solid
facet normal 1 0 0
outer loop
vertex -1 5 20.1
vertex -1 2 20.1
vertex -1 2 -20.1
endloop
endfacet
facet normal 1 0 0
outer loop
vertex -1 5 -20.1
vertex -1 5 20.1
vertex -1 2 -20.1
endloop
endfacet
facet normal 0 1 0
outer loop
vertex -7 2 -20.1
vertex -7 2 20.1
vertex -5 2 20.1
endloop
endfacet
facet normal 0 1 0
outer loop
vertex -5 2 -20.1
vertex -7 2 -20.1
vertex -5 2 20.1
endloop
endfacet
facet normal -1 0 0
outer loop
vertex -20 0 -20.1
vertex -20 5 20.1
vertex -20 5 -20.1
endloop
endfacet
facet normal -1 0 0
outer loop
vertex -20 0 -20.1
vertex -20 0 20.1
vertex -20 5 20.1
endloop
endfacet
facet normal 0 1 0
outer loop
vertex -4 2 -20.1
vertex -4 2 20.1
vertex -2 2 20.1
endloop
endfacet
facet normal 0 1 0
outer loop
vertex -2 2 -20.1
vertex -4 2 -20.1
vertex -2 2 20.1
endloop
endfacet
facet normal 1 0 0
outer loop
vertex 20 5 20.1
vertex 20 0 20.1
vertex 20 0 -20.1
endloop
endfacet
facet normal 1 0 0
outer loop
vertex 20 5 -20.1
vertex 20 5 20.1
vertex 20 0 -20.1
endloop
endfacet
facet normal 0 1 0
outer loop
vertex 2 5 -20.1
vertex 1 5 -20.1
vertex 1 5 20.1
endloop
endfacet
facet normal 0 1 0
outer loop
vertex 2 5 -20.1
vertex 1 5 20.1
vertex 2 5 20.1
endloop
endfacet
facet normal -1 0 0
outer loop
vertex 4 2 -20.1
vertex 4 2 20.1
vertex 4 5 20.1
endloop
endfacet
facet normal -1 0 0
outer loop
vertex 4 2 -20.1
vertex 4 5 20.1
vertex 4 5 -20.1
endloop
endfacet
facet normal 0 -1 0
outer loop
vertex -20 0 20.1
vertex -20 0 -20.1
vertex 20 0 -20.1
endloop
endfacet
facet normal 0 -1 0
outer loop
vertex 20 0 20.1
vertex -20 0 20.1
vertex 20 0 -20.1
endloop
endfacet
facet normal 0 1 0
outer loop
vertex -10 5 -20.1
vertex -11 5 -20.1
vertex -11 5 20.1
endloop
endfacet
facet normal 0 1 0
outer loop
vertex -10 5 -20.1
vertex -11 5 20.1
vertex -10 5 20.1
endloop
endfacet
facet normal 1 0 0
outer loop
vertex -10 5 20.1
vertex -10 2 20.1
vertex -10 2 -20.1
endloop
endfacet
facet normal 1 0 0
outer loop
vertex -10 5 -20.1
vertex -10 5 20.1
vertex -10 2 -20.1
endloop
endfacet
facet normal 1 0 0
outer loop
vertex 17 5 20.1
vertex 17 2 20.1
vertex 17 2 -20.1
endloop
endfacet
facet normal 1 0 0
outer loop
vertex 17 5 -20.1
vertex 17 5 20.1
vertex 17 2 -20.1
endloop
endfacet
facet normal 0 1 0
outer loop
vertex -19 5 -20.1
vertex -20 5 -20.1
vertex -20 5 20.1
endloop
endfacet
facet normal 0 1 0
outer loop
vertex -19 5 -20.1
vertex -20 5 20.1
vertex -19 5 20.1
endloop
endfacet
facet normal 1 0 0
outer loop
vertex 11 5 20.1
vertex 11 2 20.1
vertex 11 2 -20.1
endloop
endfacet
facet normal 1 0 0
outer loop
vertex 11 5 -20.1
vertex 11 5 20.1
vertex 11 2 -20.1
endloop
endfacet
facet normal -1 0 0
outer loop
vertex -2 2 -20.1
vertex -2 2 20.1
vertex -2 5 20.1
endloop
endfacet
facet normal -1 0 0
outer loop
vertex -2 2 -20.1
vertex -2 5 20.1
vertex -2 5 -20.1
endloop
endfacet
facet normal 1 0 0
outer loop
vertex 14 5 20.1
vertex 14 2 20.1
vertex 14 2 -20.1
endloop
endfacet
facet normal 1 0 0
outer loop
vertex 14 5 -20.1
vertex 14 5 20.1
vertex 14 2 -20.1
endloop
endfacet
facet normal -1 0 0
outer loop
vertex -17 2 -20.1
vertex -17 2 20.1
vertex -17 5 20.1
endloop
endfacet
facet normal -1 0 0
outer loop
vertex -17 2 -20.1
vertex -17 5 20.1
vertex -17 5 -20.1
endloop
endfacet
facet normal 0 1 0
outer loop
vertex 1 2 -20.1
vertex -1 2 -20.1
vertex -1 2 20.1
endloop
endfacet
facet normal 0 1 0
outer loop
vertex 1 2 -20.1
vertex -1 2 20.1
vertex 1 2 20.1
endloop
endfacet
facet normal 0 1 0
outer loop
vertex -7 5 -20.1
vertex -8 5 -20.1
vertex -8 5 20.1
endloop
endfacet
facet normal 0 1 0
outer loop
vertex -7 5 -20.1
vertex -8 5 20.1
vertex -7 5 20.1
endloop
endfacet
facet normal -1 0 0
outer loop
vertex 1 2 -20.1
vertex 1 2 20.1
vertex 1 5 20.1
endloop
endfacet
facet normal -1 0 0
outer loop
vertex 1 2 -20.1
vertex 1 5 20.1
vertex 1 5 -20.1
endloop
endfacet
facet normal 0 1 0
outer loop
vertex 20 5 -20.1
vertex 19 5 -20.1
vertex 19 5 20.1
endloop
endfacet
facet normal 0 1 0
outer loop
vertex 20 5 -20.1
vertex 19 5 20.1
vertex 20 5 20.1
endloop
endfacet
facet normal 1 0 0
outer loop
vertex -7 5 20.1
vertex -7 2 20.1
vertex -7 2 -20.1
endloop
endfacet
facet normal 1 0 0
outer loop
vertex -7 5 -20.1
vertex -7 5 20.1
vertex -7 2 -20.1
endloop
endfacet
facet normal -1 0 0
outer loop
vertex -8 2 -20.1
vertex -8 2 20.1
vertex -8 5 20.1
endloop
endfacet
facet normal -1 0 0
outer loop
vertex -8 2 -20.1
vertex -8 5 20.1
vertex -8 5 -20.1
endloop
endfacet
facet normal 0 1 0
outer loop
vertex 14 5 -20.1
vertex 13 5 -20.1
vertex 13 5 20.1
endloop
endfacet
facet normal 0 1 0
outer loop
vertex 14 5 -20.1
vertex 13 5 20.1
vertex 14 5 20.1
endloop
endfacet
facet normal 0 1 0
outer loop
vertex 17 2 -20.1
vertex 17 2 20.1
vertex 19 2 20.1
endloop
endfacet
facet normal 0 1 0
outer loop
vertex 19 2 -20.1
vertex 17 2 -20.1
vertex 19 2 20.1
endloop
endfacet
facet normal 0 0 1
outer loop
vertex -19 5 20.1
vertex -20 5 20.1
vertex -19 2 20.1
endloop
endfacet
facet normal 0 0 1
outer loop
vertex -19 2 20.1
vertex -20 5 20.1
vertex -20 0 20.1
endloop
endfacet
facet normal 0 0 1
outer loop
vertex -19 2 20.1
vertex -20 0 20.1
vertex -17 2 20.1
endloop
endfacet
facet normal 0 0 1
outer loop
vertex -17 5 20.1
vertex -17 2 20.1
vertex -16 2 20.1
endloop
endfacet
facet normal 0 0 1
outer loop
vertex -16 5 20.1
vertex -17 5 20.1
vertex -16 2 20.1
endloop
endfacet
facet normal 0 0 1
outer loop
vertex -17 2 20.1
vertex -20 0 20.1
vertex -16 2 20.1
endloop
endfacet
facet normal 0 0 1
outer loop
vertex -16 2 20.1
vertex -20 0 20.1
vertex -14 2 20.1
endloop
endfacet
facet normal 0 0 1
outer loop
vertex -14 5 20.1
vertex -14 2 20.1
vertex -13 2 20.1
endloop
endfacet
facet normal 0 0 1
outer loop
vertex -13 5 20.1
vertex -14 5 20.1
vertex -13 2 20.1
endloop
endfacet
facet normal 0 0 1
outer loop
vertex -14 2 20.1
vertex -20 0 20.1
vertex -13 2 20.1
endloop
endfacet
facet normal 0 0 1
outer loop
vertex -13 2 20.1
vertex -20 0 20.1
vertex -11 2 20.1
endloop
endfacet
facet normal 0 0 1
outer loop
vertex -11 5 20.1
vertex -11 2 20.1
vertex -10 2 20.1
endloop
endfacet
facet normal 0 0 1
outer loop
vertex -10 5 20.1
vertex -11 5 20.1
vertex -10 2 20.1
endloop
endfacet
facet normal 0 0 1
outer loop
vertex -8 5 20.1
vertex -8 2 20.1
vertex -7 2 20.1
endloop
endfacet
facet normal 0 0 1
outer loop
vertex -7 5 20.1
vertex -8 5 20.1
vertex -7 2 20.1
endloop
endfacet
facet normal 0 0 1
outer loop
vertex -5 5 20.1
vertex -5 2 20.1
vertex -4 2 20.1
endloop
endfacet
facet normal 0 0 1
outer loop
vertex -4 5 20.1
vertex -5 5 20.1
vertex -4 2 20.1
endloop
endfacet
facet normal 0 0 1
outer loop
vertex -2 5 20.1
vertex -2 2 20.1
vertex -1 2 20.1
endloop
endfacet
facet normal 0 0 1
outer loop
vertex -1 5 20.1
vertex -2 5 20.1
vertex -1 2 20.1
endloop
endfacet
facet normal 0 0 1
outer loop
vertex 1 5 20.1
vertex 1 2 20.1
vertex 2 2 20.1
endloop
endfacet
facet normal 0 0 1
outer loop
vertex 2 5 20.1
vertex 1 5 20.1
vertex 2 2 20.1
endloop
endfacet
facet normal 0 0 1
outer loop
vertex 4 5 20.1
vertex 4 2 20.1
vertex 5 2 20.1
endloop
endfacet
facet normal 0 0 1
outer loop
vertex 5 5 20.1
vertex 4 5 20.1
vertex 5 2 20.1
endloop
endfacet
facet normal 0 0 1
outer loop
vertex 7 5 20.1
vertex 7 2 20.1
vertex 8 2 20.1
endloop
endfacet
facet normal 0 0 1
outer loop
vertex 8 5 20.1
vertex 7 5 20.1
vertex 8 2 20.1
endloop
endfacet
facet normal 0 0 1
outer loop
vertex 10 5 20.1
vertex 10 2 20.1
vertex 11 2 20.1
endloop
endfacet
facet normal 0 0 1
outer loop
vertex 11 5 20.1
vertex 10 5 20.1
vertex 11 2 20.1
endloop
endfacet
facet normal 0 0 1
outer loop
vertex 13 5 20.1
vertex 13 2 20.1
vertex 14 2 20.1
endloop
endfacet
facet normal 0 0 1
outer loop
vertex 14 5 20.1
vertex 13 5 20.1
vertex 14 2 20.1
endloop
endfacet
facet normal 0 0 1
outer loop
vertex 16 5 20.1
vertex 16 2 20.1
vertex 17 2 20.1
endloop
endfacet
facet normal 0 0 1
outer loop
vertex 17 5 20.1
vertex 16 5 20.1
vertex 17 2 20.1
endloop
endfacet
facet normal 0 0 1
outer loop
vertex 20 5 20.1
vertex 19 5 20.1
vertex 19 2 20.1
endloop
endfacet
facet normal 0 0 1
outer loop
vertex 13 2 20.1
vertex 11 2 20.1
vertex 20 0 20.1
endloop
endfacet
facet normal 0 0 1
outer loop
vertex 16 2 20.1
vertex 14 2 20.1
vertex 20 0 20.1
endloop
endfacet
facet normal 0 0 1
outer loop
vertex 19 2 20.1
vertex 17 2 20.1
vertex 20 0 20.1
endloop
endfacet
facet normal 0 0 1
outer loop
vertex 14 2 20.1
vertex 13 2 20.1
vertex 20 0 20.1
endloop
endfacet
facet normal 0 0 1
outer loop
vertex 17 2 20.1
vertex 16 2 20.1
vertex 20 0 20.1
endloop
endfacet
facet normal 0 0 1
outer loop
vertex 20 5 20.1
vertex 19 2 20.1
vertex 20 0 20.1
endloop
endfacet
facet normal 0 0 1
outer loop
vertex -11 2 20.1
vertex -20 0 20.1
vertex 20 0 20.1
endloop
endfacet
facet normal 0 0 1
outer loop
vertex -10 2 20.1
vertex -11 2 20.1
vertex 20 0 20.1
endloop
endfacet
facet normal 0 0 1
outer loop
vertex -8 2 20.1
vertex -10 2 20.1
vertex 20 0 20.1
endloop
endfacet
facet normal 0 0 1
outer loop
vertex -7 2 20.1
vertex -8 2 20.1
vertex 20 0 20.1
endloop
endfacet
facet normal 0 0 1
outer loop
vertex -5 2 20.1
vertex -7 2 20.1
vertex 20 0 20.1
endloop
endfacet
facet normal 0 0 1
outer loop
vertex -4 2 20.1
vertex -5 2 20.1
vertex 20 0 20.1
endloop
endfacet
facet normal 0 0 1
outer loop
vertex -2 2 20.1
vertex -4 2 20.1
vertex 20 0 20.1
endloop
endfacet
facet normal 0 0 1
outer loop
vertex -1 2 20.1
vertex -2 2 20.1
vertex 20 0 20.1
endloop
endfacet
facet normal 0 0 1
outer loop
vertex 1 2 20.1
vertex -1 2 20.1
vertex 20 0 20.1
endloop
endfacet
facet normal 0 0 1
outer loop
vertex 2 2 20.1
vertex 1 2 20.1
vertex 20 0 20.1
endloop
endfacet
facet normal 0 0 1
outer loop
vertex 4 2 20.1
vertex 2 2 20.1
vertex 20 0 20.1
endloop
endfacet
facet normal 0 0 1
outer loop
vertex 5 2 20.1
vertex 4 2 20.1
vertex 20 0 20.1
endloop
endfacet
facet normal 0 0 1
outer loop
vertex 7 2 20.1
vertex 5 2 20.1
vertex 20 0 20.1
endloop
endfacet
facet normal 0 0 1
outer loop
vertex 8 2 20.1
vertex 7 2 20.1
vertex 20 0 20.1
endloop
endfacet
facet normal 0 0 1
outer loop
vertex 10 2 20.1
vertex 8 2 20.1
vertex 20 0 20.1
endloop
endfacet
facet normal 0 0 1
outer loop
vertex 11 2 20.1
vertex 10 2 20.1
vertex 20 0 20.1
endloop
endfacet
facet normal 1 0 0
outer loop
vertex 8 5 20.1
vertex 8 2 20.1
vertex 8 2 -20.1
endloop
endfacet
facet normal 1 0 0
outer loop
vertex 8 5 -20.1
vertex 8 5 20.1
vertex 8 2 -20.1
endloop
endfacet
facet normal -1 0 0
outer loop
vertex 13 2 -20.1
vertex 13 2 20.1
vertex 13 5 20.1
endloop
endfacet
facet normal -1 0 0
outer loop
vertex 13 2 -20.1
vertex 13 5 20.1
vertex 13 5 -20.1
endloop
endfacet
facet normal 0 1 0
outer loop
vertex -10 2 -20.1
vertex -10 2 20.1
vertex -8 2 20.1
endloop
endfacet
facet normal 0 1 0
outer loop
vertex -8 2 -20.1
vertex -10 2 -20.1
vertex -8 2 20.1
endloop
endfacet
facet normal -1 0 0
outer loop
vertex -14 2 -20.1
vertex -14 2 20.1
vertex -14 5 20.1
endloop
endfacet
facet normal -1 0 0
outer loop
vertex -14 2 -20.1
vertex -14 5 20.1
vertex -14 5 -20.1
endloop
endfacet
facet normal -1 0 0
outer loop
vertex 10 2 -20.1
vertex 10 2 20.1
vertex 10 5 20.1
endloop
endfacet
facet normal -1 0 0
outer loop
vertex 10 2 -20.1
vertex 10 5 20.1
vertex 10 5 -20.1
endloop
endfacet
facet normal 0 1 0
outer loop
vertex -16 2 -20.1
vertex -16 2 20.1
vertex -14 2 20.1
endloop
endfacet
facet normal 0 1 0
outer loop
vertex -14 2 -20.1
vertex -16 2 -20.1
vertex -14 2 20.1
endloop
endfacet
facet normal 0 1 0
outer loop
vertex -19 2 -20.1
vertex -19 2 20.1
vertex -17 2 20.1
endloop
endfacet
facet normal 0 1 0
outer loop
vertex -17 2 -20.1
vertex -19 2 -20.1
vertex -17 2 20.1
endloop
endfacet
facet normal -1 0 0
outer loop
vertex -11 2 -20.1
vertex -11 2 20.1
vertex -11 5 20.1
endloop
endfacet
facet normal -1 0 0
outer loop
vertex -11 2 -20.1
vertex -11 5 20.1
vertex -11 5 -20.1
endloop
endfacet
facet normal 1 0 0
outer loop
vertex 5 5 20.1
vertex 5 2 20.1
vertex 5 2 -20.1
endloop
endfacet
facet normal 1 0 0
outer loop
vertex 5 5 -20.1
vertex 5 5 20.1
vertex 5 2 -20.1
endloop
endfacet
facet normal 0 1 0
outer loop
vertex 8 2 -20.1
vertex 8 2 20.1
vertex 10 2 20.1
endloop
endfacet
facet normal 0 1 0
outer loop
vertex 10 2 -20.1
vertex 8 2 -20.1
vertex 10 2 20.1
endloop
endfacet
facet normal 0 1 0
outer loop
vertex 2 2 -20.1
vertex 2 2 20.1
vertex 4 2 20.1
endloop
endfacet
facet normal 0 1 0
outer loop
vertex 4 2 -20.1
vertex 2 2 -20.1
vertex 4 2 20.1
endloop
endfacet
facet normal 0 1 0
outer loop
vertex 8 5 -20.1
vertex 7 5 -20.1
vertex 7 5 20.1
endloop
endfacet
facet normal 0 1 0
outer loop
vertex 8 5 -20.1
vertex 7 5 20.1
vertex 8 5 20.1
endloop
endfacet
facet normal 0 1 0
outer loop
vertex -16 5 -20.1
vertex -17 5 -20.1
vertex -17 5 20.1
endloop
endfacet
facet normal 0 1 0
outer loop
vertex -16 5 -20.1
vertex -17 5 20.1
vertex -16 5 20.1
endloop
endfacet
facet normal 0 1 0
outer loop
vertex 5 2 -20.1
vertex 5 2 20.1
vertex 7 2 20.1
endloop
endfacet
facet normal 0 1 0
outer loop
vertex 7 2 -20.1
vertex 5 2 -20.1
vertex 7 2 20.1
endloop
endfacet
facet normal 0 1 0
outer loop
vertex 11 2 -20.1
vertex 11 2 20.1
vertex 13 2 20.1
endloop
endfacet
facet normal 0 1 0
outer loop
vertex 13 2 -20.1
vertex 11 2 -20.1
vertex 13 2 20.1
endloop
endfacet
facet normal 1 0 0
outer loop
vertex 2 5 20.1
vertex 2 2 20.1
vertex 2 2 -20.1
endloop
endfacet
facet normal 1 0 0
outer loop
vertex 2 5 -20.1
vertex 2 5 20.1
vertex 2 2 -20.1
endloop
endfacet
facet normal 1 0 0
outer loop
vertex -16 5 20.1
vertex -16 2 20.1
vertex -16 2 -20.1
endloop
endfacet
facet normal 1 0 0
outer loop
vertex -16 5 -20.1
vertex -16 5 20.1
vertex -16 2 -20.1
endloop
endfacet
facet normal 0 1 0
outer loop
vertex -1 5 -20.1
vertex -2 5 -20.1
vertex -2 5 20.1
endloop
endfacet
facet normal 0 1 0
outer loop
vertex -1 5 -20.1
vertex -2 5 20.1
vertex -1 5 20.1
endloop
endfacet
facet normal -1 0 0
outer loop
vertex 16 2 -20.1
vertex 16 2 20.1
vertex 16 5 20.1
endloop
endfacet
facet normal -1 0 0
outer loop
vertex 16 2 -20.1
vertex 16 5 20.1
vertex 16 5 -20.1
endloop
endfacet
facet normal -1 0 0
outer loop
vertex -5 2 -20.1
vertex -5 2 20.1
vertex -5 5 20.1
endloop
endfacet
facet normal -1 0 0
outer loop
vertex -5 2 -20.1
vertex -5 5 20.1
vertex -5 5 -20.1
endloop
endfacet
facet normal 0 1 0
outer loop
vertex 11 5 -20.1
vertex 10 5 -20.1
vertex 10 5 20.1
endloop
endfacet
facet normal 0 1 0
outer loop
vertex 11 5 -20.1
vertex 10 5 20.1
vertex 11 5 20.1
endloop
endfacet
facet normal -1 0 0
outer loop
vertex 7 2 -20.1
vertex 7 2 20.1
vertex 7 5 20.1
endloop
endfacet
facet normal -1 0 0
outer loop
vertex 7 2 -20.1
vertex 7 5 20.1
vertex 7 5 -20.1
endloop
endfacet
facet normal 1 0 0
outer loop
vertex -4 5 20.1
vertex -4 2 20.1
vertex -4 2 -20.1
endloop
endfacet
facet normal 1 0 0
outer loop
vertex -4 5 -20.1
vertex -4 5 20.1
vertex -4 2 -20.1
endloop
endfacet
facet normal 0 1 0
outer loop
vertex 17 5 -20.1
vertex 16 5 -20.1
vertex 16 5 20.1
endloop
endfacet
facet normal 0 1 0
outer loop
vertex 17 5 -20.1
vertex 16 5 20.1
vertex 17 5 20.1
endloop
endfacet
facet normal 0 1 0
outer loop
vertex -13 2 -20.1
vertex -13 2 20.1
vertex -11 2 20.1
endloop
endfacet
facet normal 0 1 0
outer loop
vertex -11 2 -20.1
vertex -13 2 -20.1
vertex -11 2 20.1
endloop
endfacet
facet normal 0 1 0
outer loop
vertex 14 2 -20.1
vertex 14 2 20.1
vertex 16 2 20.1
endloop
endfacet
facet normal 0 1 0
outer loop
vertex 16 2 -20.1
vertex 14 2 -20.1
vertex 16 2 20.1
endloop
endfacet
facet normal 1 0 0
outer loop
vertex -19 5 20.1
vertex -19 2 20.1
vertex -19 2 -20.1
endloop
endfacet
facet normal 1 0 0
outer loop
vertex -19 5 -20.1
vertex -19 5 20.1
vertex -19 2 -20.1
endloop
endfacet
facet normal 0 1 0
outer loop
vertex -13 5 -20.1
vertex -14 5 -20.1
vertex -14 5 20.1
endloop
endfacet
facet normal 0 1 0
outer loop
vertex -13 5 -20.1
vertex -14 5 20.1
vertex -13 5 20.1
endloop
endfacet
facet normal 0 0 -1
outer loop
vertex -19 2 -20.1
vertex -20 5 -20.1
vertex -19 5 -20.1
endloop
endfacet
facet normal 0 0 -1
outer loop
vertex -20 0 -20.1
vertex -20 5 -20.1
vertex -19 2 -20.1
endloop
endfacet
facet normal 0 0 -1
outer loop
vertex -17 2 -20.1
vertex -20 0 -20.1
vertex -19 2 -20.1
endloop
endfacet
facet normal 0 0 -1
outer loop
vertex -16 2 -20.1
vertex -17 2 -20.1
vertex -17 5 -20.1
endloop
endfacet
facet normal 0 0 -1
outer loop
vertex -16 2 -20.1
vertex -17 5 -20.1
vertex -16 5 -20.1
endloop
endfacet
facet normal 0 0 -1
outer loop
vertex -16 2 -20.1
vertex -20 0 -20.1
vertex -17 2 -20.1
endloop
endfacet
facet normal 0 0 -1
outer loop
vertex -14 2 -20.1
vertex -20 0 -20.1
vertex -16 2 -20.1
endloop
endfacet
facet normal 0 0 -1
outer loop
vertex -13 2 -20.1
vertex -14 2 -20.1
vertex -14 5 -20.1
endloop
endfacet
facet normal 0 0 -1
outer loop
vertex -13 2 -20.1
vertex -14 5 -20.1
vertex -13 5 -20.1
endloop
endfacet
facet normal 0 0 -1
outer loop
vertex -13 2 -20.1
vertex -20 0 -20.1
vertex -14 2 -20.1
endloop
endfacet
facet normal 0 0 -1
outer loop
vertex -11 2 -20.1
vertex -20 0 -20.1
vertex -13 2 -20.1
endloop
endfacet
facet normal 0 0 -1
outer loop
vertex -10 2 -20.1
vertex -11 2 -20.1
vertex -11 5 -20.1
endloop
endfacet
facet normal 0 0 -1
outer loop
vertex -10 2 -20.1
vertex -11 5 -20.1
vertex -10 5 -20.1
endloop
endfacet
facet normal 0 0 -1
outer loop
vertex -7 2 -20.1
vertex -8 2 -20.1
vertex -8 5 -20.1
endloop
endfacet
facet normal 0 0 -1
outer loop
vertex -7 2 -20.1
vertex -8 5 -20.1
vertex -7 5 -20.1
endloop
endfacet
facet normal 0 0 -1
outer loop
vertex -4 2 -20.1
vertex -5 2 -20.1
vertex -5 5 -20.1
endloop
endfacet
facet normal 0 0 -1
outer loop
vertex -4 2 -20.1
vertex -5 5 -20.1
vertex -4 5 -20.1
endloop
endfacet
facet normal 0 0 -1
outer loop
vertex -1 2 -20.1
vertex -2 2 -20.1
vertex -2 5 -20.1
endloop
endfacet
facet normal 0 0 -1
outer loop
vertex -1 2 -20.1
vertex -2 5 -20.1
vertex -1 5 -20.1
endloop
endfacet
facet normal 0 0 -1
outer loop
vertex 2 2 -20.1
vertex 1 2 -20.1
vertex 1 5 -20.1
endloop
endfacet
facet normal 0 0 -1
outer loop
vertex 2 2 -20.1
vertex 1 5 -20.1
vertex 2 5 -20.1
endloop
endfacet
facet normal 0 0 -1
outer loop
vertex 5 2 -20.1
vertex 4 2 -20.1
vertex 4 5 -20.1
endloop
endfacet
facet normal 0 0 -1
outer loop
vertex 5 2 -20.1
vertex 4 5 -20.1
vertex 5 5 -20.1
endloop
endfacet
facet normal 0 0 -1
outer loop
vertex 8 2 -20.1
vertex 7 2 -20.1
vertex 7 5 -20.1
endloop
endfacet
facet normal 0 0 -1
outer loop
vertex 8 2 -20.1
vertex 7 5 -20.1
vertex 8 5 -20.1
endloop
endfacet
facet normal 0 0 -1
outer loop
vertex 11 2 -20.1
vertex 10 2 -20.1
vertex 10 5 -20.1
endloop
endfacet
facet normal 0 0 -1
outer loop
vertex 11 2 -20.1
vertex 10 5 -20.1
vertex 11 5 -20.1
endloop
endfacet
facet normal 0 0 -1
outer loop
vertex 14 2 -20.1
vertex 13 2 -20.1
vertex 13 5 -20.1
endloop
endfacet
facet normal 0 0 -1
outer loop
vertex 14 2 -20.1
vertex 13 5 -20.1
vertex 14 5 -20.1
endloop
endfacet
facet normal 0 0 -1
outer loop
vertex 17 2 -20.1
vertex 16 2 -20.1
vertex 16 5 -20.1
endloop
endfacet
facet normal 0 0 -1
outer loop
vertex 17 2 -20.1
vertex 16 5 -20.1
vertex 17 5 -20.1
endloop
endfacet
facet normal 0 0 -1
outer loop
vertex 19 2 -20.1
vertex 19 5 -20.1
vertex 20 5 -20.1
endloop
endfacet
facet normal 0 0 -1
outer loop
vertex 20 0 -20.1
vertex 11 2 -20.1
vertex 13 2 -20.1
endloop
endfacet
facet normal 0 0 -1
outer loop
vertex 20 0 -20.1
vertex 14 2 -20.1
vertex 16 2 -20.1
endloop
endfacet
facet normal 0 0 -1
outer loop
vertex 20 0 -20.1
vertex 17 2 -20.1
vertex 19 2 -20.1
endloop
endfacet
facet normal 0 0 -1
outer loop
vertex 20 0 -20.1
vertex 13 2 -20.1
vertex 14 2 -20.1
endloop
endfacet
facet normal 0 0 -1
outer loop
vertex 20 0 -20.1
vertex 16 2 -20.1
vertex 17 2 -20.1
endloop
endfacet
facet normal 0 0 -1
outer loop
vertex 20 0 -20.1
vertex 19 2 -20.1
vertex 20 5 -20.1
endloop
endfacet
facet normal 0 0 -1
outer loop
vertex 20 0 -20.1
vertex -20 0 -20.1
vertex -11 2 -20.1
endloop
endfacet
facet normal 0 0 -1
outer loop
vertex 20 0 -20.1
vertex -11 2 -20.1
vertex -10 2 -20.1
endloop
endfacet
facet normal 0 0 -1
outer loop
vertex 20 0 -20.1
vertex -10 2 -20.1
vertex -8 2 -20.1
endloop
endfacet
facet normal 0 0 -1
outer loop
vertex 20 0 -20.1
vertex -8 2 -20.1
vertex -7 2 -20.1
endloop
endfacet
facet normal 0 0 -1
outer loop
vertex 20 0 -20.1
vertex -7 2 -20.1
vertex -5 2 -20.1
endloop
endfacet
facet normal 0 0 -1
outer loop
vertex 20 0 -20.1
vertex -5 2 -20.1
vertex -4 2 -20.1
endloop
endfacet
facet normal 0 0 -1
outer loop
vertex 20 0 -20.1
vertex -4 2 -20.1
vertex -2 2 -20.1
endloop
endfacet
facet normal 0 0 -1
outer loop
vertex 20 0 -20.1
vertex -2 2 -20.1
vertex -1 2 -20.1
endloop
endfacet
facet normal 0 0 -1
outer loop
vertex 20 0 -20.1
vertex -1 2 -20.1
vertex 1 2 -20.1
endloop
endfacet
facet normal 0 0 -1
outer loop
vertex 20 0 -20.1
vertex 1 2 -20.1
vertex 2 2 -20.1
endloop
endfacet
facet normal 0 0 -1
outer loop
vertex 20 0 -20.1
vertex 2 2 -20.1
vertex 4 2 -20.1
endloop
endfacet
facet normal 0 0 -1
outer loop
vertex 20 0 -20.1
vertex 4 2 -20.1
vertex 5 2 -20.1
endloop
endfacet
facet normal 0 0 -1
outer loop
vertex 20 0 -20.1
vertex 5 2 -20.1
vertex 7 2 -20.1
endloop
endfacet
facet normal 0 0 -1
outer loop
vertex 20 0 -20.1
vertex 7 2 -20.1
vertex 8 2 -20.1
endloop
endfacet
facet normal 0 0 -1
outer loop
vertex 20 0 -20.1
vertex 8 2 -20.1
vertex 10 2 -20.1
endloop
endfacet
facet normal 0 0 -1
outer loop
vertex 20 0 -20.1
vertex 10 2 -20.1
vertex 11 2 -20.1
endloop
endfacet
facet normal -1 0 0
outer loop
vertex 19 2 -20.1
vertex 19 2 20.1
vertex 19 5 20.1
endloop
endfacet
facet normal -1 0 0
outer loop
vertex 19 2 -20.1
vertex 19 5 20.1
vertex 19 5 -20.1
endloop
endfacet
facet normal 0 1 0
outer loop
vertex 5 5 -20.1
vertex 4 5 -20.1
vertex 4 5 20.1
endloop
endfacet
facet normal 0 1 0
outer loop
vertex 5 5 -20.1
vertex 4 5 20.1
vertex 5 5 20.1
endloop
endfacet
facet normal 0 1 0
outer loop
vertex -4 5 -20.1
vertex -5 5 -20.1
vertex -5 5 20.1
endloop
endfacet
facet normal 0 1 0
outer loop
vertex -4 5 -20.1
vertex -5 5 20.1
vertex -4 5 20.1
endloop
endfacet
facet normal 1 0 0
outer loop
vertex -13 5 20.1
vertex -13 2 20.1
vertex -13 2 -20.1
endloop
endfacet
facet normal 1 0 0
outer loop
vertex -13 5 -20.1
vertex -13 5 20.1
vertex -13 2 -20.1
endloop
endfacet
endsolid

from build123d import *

# Parameters (mm, degrees)
SKETCH_1_W      = 40
SKETCH_1_H      = 40.2
EXTRUDE_1_DEPTH = 2
SKETCH_2_W      = 1
SKETCH_2_H      = 40.2
EXTRUDE_2_DEPTH = 3


with BuildPart() as part:
    # 草图1 → 凸台-拉伸1 (new body)
    with BuildSketch(Plane(origin=(0, 0, 0), x_dir=(1, 0, 0), z_dir=(0, 1, 0))):
        Rectangle(SKETCH_1_W, SKETCH_1_H)
    extrude(amount=EXTRUDE_1_DEPTH)

    # 草图2 → 凸台-拉伸2 (add)
    with BuildSketch(Plane(origin=(0, 2, 0), x_dir=(1, 0, 0), z_dir=(0, 1, 0))):
        with Locations((-19.5, 0)):
            Rectangle(SKETCH_2_W, SKETCH_2_H)
        with Locations((-16.5, 0)):
            Rectangle(SKETCH_2_W, SKETCH_2_H)
        with Locations((-13.5, 0)):
            Rectangle(SKETCH_2_W, SKETCH_2_H)
        with Locations((-10.5, 0)):
            Rectangle(SKETCH_2_W, SKETCH_2_H)
        with Locations((-7.5, 0)):
            Rectangle(SKETCH_2_W, SKETCH_2_H)
        with Locations((-4.5, 0)):
            Rectangle(SKETCH_2_W, SKETCH_2_H)
        with Locations((-1.5, 0)):
            Rectangle(SKETCH_2_W, SKETCH_2_H)
        with Locations((1.5, 0)):
            Rectangle(SKETCH_2_W, SKETCH_2_H)
        with Locations((4.5, 0)):
            Rectangle(SKETCH_2_W, SKETCH_2_H)
        with Locations((7.5, 0)):
            Rectangle(SKETCH_2_W, SKETCH_2_H)
        with Locations((10.5, 0)):
            Rectangle(SKETCH_2_W, SKETCH_2_H)
        with Locations((13.5, 0)):
            Rectangle(SKETCH_2_W, SKETCH_2_H)
        with Locations((16.5, 0)):
            Rectangle(SKETCH_2_W, SKETCH_2_H)
        with Locations((19.5, 0)):
            Rectangle(SKETCH_2_W, SKETCH_2_H)
    extrude(amount=EXTRUDE_2_DEPTH)


solid = part.part
